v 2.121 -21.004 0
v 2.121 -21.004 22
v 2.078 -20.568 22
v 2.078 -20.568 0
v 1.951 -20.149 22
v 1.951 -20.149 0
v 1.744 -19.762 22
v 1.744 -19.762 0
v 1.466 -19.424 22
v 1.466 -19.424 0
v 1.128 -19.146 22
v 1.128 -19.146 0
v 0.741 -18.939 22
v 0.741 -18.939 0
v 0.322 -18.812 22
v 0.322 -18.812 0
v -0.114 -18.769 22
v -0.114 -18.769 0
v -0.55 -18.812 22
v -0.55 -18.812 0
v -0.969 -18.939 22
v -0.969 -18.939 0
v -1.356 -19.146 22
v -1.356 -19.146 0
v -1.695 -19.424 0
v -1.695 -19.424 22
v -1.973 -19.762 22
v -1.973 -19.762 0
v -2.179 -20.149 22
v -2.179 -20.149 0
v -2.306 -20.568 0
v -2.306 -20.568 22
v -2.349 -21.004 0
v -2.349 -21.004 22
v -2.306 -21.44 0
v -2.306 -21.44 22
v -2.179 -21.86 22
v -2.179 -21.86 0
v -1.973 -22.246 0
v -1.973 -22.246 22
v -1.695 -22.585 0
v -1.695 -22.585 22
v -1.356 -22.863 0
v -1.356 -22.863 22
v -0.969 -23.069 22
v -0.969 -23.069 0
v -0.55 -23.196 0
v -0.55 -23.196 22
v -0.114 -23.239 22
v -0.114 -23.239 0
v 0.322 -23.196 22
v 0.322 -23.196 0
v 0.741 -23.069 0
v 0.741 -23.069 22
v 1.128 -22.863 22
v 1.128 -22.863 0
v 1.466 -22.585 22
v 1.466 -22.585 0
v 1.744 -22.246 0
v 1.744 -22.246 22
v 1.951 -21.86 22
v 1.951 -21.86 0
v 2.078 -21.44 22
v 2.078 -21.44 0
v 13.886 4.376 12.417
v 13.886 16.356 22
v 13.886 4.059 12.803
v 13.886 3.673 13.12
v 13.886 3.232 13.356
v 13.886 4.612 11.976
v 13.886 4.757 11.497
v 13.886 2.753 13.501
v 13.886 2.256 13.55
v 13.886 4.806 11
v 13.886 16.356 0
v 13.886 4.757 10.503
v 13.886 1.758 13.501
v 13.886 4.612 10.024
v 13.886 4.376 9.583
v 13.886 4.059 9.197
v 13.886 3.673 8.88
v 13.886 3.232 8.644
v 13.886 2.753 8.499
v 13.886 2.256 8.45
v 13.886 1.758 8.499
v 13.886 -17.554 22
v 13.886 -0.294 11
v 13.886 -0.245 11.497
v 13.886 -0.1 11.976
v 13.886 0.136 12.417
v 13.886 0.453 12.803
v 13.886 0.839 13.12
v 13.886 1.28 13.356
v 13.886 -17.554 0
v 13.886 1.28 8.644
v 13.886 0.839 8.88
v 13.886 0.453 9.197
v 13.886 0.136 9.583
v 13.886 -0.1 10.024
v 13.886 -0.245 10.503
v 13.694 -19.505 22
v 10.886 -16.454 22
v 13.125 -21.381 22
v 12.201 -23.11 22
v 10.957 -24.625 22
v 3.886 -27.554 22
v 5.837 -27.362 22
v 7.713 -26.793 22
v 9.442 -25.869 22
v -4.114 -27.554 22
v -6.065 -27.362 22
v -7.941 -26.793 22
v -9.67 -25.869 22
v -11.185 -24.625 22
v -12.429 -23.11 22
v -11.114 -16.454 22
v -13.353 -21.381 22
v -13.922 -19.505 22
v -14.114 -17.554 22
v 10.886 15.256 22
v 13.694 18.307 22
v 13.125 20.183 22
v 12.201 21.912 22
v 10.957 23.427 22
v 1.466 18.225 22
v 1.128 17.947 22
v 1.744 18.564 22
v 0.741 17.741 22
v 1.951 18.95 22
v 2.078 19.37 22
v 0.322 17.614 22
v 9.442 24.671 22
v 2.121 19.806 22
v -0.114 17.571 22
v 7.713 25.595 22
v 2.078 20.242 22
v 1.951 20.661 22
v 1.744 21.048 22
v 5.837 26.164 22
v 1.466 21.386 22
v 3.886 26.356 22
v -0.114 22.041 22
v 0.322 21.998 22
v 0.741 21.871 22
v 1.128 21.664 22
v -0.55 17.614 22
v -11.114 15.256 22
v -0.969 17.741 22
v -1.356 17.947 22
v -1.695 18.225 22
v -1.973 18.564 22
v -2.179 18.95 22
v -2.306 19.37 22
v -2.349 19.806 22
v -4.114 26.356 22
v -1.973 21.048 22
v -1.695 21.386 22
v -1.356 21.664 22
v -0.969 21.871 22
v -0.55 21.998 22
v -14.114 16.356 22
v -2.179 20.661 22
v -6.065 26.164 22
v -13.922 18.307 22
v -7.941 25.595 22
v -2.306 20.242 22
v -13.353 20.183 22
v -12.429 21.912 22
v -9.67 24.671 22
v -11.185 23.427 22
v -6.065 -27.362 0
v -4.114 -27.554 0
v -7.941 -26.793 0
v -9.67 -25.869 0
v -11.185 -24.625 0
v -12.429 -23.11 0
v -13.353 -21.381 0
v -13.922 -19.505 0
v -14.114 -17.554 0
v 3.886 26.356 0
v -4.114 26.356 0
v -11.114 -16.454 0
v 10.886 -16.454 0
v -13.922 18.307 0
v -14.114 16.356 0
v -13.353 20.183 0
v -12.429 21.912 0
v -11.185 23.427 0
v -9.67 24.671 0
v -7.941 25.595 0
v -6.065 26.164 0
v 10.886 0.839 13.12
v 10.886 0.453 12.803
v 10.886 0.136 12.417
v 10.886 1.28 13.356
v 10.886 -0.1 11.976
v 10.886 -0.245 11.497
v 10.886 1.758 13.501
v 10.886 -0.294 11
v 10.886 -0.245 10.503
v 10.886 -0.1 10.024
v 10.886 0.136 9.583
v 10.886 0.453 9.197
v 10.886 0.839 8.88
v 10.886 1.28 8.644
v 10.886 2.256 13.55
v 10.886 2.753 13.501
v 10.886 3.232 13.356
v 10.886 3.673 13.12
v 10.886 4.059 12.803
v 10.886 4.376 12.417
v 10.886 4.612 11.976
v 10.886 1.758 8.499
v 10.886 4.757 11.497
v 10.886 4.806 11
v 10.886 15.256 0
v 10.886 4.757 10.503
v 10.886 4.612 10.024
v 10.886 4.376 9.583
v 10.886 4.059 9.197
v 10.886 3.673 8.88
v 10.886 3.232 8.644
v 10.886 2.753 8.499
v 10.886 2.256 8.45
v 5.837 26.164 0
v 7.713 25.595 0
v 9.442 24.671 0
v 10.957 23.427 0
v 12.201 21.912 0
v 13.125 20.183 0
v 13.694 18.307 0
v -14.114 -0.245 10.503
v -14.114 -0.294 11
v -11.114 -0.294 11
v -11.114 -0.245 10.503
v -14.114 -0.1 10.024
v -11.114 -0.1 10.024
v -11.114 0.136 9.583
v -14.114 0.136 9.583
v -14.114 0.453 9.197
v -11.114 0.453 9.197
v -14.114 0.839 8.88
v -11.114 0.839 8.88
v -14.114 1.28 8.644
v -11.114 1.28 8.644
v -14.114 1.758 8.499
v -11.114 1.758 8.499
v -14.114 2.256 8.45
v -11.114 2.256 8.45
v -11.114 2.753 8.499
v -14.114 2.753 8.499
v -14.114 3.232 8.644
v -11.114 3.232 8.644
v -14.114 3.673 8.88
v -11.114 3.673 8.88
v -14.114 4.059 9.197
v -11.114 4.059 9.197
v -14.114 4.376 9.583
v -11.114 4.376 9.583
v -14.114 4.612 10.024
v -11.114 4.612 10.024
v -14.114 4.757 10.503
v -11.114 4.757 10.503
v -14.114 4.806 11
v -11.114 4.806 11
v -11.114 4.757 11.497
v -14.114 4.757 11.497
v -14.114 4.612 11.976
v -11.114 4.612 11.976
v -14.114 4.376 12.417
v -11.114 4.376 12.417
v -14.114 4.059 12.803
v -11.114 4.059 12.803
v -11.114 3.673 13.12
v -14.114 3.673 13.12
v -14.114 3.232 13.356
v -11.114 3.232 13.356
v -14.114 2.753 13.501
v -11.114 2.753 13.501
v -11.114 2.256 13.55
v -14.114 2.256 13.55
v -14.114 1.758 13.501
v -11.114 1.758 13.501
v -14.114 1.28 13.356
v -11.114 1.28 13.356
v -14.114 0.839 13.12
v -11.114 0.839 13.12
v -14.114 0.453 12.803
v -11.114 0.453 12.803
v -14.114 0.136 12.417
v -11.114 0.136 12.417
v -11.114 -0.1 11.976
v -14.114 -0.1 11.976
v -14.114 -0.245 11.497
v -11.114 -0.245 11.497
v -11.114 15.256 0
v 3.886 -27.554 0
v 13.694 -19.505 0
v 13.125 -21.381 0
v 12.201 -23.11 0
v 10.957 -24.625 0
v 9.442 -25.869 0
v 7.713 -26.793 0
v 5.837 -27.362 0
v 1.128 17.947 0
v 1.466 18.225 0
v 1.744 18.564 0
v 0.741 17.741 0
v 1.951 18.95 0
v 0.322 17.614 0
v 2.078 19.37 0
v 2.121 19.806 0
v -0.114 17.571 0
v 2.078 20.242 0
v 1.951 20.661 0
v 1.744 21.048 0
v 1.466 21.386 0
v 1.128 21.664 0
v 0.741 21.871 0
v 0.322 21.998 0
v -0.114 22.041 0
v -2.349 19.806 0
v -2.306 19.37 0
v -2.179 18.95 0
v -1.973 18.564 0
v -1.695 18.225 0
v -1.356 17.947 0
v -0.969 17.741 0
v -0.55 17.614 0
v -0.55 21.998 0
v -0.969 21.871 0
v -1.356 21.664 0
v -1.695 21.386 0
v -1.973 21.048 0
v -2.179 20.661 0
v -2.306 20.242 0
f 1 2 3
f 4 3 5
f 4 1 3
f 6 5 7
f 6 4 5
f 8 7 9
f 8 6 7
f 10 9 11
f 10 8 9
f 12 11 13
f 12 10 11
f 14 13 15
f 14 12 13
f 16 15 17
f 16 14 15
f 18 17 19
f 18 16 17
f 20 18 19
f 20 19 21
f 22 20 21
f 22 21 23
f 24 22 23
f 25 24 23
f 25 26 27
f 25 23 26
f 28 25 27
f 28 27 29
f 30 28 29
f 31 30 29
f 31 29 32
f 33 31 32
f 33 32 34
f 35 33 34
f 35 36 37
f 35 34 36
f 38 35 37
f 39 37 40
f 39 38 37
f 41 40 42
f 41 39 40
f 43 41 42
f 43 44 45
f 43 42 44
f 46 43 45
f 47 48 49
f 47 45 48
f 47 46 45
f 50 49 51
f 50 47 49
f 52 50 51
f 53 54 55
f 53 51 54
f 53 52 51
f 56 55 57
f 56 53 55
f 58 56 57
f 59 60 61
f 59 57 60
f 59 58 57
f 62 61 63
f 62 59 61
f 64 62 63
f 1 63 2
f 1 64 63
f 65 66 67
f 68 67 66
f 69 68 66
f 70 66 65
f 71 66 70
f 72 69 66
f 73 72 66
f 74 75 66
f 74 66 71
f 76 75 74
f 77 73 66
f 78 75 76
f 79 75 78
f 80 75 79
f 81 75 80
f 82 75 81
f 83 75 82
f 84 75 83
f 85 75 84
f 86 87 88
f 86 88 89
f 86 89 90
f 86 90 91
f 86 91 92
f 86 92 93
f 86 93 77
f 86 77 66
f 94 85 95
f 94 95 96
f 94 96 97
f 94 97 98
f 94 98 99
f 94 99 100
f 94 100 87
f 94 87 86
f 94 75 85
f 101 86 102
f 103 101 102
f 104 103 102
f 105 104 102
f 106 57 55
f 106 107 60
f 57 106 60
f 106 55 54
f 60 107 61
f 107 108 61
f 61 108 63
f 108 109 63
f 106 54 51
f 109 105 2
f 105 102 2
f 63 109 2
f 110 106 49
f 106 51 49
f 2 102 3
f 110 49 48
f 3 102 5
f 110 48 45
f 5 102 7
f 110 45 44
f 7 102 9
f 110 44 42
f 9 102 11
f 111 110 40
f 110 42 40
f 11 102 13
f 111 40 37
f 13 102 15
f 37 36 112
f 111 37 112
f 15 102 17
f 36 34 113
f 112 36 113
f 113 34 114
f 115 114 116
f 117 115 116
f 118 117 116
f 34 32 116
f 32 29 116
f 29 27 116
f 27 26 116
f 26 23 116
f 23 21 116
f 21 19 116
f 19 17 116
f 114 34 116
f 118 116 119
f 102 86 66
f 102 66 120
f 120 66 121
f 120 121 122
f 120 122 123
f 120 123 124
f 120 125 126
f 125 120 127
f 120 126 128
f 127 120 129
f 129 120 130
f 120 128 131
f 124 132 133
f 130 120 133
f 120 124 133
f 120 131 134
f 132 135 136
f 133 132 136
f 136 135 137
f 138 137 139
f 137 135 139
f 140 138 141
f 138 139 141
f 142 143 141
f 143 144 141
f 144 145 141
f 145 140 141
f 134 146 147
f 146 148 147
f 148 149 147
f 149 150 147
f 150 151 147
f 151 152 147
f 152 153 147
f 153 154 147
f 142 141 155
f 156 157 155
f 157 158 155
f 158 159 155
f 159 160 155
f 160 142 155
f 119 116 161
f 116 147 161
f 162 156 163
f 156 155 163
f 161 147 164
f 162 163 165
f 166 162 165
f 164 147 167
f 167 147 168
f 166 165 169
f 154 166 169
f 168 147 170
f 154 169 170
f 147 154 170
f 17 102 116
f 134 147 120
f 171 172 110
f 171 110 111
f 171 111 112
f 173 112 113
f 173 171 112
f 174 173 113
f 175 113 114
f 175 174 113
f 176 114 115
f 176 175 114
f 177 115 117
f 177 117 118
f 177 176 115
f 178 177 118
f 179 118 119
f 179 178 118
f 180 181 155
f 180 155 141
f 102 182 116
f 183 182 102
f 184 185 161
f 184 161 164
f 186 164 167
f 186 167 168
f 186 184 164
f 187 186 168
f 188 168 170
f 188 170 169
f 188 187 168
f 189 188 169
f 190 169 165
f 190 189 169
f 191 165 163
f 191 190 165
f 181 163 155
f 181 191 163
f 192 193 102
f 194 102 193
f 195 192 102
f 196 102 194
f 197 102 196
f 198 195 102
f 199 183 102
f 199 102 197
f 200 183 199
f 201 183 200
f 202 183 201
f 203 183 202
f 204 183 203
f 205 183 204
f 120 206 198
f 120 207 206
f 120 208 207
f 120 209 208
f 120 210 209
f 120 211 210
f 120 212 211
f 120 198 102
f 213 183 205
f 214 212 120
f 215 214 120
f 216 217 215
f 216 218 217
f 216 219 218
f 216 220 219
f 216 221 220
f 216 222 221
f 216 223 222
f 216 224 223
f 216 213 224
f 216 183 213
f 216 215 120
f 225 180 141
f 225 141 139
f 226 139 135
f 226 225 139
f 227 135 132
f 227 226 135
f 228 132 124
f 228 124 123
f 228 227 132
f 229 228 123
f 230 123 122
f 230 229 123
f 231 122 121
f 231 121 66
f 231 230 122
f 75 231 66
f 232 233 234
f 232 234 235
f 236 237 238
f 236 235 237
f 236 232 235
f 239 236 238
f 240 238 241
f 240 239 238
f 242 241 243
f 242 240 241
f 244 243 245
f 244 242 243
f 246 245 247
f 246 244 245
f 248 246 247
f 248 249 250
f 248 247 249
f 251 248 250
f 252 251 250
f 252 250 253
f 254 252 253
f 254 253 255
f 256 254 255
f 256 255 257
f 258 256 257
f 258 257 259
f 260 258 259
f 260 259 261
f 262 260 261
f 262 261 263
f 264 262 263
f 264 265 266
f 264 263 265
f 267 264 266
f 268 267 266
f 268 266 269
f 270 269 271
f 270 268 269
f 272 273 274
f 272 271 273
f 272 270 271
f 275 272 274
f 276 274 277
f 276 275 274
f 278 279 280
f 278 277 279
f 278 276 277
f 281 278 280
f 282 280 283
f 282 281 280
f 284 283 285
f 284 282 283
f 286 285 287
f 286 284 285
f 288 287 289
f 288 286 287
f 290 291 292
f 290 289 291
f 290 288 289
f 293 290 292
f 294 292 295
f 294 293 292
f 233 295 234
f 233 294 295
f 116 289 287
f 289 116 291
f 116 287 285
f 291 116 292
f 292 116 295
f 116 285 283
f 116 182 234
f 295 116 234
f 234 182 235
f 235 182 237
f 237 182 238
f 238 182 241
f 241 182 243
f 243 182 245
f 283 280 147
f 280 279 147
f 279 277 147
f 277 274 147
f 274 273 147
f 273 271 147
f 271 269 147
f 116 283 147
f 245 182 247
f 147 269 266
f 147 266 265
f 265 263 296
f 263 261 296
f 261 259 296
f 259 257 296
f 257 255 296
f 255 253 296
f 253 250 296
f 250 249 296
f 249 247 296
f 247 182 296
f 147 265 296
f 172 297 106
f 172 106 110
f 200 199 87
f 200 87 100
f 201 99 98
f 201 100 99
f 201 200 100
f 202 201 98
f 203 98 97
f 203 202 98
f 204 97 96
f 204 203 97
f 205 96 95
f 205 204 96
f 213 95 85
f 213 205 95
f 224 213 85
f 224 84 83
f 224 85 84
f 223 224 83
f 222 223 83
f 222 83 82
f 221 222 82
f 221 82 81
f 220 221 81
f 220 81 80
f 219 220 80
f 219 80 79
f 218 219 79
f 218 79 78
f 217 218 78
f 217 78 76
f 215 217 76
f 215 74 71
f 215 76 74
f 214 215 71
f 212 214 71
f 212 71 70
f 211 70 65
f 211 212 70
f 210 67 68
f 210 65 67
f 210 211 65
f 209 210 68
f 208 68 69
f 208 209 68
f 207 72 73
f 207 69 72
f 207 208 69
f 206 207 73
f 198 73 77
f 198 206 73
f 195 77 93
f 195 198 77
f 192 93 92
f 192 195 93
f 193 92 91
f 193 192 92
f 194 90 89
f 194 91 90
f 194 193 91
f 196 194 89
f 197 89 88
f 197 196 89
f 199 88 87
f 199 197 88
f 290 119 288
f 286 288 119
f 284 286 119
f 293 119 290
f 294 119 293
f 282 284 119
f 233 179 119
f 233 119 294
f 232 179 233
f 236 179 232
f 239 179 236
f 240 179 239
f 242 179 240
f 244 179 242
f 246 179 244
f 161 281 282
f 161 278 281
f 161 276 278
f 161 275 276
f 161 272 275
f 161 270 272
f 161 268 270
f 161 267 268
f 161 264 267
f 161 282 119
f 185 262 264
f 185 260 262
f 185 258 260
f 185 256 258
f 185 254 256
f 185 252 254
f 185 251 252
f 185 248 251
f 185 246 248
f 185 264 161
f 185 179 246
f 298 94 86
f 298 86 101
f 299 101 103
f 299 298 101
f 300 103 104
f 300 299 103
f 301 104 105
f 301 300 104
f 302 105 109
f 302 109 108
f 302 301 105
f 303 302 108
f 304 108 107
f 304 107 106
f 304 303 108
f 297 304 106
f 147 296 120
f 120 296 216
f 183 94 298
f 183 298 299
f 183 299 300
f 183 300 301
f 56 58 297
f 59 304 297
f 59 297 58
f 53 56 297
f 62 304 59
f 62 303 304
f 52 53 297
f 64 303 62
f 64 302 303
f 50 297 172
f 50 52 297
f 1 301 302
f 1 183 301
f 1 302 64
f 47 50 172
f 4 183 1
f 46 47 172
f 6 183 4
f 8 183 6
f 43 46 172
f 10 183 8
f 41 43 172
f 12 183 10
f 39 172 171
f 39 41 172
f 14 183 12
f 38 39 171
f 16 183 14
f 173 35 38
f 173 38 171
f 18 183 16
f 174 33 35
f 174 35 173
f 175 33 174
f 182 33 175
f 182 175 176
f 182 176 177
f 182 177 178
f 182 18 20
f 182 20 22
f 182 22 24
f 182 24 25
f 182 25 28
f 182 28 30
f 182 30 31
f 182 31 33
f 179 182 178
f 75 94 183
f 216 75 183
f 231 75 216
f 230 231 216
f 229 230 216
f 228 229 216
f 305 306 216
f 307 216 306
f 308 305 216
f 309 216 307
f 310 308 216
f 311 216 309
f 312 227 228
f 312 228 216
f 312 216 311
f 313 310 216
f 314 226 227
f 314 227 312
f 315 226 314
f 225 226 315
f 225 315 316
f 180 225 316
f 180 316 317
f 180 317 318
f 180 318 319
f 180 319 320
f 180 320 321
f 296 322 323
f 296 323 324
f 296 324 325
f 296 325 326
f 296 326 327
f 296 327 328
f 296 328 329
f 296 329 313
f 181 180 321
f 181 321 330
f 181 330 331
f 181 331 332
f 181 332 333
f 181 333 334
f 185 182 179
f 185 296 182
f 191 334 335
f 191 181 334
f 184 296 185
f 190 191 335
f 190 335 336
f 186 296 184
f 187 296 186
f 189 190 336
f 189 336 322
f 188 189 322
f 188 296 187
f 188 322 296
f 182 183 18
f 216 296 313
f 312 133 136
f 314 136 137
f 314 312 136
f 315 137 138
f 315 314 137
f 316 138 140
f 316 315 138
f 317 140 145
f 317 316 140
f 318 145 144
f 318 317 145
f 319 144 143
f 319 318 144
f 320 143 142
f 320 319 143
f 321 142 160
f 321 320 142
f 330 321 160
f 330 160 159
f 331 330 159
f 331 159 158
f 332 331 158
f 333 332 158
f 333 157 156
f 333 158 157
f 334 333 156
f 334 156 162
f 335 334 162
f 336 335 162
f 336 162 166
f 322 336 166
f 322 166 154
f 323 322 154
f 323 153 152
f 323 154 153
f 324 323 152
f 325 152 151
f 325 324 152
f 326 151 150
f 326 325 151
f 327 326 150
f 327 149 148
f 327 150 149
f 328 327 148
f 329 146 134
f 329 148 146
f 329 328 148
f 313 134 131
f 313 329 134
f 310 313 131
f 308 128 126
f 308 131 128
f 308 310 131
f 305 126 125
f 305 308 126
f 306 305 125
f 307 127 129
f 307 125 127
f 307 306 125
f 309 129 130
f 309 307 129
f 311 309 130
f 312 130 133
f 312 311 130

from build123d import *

# Parameters (mm, degrees)
SKETCH_2_W               = 22
SKETCH_2_H               = 31.71
EXTRUDE_1_DEPTH          = 22
SKETCH_1_R               = 2.235222544
CUT_EXTRUDE_1_DEPTH      = 38.979461569
CUT_EXTRUDE_2_DEPTH      = 46.024794997
CUT_EXTRUDE_2_DEPTH_BACK = 46.024794997
SKETCH_3_R               = 2.55


with BuildPart() as part:
    # Эскиз2 → Бобышка-Вытянуть1 (new body)
    with BuildSketch(Plane.XY):
        with BuildLine():
            Line((-4.114082915, 26.355832174), (3.885917085, 26.355832174))
            ThreePointArc((3.885917085, 26.355832174), (10.956984897, 23.426899986), (13.885917085, 16.355832174))
            Line((13.885917085, 16.355832174), (13.885917085, -17.554167826))
            ThreePointArc((13.885917085, -17.554167826), (10.956984897, -24.625235638), (3.885917085, -27.554167826))
            Line((3.885917085, -27.554167826), (-4.114082915, -27.554167826))
            ThreePointArc((-4.114082915, -27.554167826), (-11.185150727, -24.625235638), (-14.114082915, -17.554167826))
            Line((-14.114082915, -17.554167826), (-14.114082915, 16.355832174))
            ThreePointArc((-14.114082915, 16.355832174), (-11.185150727, 23.426899986), (-4.114082915, 26.355832174))
        make_face()
        with Locations((-0.114082915, -0.599167826)):
            Rectangle(SKETCH_2_W, SKETCH_2_H, mode=Mode.SUBTRACT)
    extrude(amount=EXTRUDE_1_DEPTH)

    # Эскиз1 → Вырез-Вытянуть1 (cut, through all)
    with BuildSketch(Plane.XY):
        with Locations((-0.114082915, 19.805832174)):
            Circle(SKETCH_1_R)
        with Locations((-0.114082915, -21.004167826)):
            Circle(SKETCH_1_R)
    extrude(amount=CUT_EXTRUDE_1_DEPTH, mode=Mode.SUBTRACT)

    # Эскиз3 → Вырез-Вытянуть2 (cut, two sides: drawn at the far end of the back side and taken through both)
    with BuildSketch(Plane(origin=(13.885917085, 0, 0), x_dir=(0, 0, -1), z_dir=(1, 0, 0)).offset(-CUT_EXTRUDE_2_DEPTH_BACK)):
        with Locations(Location((-11, 2.255832174, 0), (0, 0, 270))):
            Circle(SKETCH_3_R)
    extrude(amount=CUT_EXTRUDE_2_DEPTH + CUT_EXTRUDE_2_DEPTH_BACK, mode=Mode.SUBTRACT)


solid = part.part
